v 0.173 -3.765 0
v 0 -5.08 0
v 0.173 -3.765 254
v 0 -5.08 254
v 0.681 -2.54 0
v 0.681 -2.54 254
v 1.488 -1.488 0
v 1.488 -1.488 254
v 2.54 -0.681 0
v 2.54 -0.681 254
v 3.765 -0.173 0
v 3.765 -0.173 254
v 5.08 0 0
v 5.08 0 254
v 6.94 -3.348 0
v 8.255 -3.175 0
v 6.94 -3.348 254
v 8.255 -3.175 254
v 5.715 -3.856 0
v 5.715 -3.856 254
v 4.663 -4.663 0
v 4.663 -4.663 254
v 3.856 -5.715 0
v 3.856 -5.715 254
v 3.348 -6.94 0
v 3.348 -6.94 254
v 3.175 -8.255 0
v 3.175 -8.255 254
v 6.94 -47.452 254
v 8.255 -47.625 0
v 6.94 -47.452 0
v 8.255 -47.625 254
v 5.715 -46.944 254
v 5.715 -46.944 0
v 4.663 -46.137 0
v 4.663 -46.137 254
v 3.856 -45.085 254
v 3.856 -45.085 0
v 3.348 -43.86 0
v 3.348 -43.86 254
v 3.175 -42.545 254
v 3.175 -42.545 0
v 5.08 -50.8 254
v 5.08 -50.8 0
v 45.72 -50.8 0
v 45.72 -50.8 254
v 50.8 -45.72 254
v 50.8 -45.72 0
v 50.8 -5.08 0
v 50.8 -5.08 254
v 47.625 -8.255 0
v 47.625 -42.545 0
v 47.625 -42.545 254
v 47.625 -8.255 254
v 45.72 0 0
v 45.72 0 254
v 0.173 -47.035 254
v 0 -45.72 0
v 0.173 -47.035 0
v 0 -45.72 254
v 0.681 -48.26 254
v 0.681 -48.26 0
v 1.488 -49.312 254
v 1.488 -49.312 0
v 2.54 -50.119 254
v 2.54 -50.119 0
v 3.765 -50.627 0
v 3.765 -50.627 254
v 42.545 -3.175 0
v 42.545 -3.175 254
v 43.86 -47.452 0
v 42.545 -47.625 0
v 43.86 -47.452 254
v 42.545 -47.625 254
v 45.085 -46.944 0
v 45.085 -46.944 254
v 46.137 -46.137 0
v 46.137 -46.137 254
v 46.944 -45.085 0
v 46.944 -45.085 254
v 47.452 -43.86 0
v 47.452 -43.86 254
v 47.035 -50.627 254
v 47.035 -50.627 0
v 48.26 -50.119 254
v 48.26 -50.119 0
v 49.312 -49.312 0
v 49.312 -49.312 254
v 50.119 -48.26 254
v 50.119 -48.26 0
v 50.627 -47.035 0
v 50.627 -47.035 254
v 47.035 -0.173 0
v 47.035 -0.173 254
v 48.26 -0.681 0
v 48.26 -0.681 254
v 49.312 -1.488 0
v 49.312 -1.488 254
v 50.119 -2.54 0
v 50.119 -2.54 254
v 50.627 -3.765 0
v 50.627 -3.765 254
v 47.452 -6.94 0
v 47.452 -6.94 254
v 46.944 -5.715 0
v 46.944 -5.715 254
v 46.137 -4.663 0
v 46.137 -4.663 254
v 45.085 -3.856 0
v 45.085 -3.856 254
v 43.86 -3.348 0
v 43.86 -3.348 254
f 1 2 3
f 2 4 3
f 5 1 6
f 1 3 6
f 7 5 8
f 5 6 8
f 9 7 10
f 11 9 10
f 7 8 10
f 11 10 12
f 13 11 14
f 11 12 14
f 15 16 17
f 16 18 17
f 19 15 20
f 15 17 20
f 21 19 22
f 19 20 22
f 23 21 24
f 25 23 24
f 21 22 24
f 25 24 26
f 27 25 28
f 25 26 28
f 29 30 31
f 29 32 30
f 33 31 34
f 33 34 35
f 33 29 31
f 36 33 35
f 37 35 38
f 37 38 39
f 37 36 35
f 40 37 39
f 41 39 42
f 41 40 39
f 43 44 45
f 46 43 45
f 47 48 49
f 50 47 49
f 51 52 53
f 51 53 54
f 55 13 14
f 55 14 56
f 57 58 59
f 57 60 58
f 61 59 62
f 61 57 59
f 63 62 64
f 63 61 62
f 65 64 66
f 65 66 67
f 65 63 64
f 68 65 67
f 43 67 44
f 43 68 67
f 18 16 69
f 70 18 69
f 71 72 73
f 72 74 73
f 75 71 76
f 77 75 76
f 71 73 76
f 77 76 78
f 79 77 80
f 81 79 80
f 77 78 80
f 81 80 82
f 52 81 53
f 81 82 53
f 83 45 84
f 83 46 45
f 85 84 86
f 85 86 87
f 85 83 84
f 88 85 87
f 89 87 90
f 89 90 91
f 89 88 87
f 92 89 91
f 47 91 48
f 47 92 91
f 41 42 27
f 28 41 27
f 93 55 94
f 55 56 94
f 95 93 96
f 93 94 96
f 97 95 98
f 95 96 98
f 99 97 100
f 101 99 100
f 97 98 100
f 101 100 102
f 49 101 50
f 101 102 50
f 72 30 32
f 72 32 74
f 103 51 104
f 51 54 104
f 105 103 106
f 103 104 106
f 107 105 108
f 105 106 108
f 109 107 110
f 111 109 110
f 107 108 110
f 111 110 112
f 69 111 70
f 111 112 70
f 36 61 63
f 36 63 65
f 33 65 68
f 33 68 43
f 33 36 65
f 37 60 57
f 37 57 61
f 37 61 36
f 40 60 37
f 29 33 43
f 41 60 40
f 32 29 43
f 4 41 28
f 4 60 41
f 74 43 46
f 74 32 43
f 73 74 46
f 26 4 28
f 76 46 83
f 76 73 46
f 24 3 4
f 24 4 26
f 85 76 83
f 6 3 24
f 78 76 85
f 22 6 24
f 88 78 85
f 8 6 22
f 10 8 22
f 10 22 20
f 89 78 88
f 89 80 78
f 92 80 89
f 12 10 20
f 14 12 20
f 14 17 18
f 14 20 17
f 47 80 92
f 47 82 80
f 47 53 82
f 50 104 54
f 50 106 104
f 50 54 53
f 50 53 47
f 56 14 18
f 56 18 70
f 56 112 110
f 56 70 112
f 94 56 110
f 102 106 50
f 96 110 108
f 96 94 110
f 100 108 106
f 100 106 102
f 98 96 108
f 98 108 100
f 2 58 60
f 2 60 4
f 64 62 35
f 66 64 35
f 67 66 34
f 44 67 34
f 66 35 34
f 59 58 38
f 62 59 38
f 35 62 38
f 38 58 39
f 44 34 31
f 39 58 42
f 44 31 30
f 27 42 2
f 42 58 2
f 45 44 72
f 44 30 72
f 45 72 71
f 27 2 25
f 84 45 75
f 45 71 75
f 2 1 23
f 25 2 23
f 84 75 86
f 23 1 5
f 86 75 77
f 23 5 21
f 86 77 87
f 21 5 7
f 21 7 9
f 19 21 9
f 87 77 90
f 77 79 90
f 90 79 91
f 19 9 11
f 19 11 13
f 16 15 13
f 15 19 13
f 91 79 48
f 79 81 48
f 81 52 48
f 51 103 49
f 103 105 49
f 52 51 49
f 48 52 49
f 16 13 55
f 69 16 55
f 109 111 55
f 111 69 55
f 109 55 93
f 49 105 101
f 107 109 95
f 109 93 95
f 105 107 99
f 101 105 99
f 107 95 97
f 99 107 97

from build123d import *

# Parameters (mm, degrees)
F0_W     = 50.8
F0_H     = 50.8
F0_W_2   = 44.45
F0_H_2   = 44.45
F1_DEPTH = 254
F2_R     = 5.08


with BuildPart() as f1:
    # F0 (on Top) → F1 (new body)
    with BuildSketch(Plane.XY):
        with Locations((25.4, -25.4)):
            Rectangle(F0_W, F0_H)
        with Locations((25.4, -25.4)):
            Rectangle(F0_W_2, F0_H_2, mode=Mode.SUBTRACT)
    extrude(amount=F1_DEPTH)

    # F2
    f2_edges = [f1.edges().sort_by_distance(p)[0] for p in [
        (50.8, -50.8, 127),
        (0, -50.8, 127),
        (50.8, 0, 127),
        (0, 0, 127),
        (47.625, -3.175, 127),
        (3.175, -3.175, 127),
        (3.175, -47.625, 127),
        (47.625, -47.625, 127),
    ]]
    fillet(f2_edges, radius=F2_R)


solid = f1.part
